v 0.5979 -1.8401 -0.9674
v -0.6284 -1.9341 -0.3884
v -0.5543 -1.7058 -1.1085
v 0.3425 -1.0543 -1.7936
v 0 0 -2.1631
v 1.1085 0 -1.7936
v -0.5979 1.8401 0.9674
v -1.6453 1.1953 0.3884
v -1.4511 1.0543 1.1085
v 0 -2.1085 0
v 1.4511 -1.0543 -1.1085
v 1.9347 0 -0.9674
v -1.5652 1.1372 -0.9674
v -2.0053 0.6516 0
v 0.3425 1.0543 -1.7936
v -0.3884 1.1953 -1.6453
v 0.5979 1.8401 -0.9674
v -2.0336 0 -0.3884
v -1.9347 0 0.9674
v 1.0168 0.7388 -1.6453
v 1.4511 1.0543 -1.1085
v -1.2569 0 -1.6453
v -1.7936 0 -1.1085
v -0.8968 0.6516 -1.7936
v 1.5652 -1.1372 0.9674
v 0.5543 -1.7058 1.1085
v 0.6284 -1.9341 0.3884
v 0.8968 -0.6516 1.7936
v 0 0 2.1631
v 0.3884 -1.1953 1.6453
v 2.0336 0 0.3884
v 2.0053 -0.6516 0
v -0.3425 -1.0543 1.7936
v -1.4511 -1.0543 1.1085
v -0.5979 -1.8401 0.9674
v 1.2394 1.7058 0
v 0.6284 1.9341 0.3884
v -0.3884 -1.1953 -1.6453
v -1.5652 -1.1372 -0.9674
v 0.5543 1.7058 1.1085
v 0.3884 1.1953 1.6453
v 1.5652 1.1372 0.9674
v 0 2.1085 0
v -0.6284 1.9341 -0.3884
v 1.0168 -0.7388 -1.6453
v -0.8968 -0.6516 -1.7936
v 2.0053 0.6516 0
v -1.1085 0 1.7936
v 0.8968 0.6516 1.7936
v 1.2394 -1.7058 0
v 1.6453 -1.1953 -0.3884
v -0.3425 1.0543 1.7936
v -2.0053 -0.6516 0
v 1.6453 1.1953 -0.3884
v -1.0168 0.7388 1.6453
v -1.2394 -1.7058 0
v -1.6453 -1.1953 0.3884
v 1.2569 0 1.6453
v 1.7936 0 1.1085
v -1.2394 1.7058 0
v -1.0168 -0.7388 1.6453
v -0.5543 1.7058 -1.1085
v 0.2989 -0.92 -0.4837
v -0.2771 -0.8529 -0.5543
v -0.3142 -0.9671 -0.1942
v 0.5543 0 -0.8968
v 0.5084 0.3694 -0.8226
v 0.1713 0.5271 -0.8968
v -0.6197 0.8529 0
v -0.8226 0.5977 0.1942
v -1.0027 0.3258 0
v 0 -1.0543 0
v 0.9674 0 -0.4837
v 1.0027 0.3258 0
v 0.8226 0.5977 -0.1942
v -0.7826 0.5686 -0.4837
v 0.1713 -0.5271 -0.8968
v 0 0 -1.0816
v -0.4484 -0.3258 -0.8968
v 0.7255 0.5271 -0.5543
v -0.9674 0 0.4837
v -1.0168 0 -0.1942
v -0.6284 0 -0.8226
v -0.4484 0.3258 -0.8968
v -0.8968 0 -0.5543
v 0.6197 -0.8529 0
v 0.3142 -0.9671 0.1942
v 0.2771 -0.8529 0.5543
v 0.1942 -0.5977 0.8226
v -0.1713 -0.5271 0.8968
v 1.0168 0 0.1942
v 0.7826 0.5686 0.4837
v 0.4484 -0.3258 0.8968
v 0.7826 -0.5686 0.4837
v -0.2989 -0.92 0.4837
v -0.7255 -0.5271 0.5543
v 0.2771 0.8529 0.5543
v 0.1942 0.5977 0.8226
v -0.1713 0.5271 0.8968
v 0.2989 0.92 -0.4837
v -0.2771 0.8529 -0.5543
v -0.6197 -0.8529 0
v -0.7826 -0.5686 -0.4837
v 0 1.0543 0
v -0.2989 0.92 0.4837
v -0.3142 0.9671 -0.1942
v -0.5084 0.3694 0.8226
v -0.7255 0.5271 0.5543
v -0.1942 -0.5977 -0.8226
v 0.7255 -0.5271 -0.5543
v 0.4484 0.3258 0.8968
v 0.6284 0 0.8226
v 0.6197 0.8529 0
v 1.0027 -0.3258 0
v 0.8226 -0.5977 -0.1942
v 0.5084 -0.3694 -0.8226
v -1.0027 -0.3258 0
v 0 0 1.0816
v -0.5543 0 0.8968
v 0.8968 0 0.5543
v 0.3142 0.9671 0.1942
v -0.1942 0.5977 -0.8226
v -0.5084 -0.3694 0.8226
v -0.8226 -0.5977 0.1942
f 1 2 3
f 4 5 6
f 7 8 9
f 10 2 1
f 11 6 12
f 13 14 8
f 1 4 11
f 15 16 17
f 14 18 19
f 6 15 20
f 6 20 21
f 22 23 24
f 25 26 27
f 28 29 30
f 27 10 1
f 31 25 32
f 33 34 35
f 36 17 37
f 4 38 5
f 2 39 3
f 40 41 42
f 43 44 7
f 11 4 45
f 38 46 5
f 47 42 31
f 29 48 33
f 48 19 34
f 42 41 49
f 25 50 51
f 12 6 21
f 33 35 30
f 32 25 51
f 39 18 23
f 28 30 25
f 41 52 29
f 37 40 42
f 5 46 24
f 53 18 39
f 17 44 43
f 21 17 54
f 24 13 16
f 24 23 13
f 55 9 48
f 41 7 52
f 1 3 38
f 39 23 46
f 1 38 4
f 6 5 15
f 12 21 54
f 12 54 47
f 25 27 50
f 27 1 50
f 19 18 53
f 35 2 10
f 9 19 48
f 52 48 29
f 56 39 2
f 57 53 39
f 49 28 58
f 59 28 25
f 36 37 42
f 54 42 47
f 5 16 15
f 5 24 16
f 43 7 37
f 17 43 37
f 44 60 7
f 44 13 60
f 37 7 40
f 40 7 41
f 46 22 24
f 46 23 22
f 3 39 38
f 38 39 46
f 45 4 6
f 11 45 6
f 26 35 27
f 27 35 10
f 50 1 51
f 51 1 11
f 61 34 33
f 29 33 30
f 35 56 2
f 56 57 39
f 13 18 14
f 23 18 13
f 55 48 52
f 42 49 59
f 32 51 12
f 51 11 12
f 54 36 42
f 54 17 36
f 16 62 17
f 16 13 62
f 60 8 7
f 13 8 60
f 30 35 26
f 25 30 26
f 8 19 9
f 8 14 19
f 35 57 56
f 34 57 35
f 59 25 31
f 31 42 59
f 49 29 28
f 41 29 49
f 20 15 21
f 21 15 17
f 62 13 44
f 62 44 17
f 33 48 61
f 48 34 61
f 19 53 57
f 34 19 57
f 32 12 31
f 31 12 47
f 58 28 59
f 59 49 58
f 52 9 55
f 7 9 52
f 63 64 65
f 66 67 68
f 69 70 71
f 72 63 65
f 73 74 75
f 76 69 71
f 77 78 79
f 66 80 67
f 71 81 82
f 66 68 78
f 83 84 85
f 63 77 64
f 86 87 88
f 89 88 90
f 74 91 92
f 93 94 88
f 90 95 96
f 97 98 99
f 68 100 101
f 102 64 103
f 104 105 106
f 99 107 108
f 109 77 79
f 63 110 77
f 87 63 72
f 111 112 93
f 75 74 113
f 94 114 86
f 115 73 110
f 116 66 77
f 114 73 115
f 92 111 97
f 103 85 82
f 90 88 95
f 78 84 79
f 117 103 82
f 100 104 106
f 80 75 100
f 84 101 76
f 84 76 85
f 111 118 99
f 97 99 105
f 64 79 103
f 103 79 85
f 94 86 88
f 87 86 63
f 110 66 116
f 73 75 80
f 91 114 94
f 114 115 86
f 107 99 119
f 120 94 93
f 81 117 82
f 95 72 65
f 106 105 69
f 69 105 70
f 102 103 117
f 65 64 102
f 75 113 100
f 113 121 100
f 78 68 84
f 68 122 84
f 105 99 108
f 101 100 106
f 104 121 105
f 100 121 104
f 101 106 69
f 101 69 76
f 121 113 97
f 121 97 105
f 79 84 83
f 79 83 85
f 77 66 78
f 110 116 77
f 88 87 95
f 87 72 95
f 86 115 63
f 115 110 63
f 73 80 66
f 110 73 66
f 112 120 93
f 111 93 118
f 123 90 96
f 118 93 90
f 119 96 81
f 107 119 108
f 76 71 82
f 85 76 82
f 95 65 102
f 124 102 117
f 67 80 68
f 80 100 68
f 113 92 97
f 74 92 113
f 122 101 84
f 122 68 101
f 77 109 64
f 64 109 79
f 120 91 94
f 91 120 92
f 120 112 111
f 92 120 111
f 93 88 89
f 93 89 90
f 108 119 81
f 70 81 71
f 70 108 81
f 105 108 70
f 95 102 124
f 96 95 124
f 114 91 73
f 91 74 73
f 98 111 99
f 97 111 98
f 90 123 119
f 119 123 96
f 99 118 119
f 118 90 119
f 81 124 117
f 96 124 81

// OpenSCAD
module dhxdron(r) {
    scale ( [r,r,r] ){
polyhedron( points = [ [-3.142158e-01, -9.670568e-01, -1.941960e-01], [-2.771276e-01, -8.529112e-01, -5.542553e-01], [2.989346e-01, -9.200262e-01, -4.836864e-01], [0.000000e+00, -1.054256e+00, 0.000000e+00], [5.084118e-01, -3.693828e-01, -8.226276e-01], [1.712743e-01, -5.271281e-01, -8.968039e-01], [5.551115e-17, 0.000000e+00, -1.081556e+00], [5.542553e-01, 0.000000e+00, -8.968039e-01], [-6.284316e-01, 0.000000e+00, -8.226276e-01], [-4.484020e-01, -3.257831e-01, -8.968039e-01], [-7.826210e-01, -5.686075e-01, -4.836864e-01], [-8.968039e-01, 0.000000e+00, -5.542553e-01], [-3.142158e-01, 9.670568e-01, -1.941960e-01], [0.000000e+00, 1.054256e+00, -0.000000e+00], [2.989346e-01, 9.200262e-01, -4.836864e-01], [-2.771276e-01, 8.529112e-01, -5.542553e-01], [-5.084118e-01, -3.693828e-01, 8.226276e-01], [-5.542553e-01, 0.000000e+00, 8.968039e-01], [-9.673728e-01, 0.000000e+00, 4.836864e-01], [-7.255296e-01, -5.271281e-01, 5.542553e-01], [1.016824e+00, 0.000000e+00, 1.941960e-01], [8.968039e-01, 0.000000e+00, 5.542553e-01], [7.826210e-01, -5.686075e-01, 4.836864e-01], [1.002657e+00, -3.257831e-01, 5.551115e-17], [3.142158e-01, -9.670568e-01, 1.941960e-01], [6.196763e-01, -8.529112e-01, -0.000000e+00], [5.084118e-01, 3.693828e-01, -8.226276e-01], [1.712743e-01, 5.271281e-01, -8.968039e-01], [-1.016824e+00, 0.000000e+00, -1.941960e-01], [-1.002657e+00, -3.257831e-01, -5.551115e-17], [3.142158e-01, 9.670568e-01, 1.941960e-01], [6.196763e-01, 8.529112e-01, -0.000000e+00], [-5.084118e-01, 3.693828e-01, 8.226276e-01], [-7.255296e-01, 5.271281e-01, 5.542553e-01], [6.284316e-01, 0.000000e+00, 8.226276e-01], [4.484020e-01, -3.257831e-01, 8.968039e-01], [-2.989346e-01, -9.200262e-01, 4.836864e-01], [-6.196763e-01, -8.529112e-01, -0.000000e+00], [9.673728e-01, 0.000000e+00, -4.836864e-01], [7.255296e-01, -5.271281e-01, -5.542553e-01], [-7.826210e-01, 5.686075e-01, -4.836864e-01], [-4.484020e-01, 3.257831e-01, -8.968039e-01], [-6.196763e-01, 8.529112e-01, -0.000000e+00], [-2.989346e-01, 9.200262e-01, 4.836864e-01], [-1.712743e-01, -5.271281e-01, 8.968039e-01], [-5.551115e-17, 0.000000e+00, 1.081556e+00], [1.002657e+00, 3.257831e-01, 5.551115e-17], [7.826210e-01, 5.686075e-01, 4.836864e-01], [2.771276e-01, -8.529112e-01, 5.542553e-01], [7.255296e-01, 5.271281e-01, -5.542553e-01], [-1.002657e+00, 3.257831e-01, -5.551115e-17], [2.771276e-01, 8.529112e-01, 5.542553e-01], [-1.712743e-01, 5.271281e-01, 8.968039e-01], [4.484020e-01, 3.257831e-01, 8.968039e-01], [-1.941960e-01, -5.976740e-01, -8.226276e-01], [-1.941960e-01, 5.976740e-01, -8.226276e-01], [-8.226276e-01, -5.976740e-01, 1.941960e-01], [8.226276e-01, -5.976740e-01, -1.941960e-01], [8.226276e-01, 5.976740e-01, -1.941960e-01], [-8.226276e-01, 5.976740e-01, 1.941960e-01], [1.941960e-01, -5.976740e-01, 8.226276e-01], [1.941960e-01, 5.976740e-01, 8.226276e-01] ], faces = [ [ 3, 2, 1, 0 ] , [ 7, 6, 5, 4 ] , [ 11, 10, 9, 8 ] , [ 15, 14, 13, 12 ] , [ 19, 18, 17, 16 ] , [ 23, 22, 21, 20 ] , [ 25, 2, 3, 24 ] , [ 27, 6, 7, 26 ] , [ 29, 10, 11, 28 ] , [ 13, 14, 31, 30 ] , [ 17, 18, 33, 32 ] , [ 21, 22, 35, 34 ] , [ 37, 36, 3, 0 ] , [ 39, 38, 7, 4 ] , [ 41, 40, 11, 8 ] , [ 13, 43, 42, 12 ] , [ 17, 45, 44, 16 ] , [ 21, 47, 46, 20 ] , [ 3, 36, 48, 24 ] , [ 7, 38, 49, 26 ] , [ 11, 40, 50, 28 ] , [ 51, 43, 13, 30 ] , [ 52, 45, 17, 32 ] , [ 53, 47, 21, 34 ] , [ 1, 2, 5, 54 ] , [ 5, 6, 9, 54 ] , [ 9, 10, 1, 54 ] , [ 27, 14, 15, 55 ] , [ 29, 18, 19, 56 ] , [ 25, 22, 23, 57 ] , [ 39, 2, 25, 57 ] , [ 41, 6, 27, 55 ] , [ 37, 10, 29, 56 ] , [ 31, 14, 49, 58 ] , [ 33, 18, 50, 59 ] , [ 35, 22, 48, 60 ] , [ 19, 36, 37, 56 ] , [ 23, 38, 39, 57 ] , [ 15, 40, 41, 55 ] , [ 42, 43, 33, 59 ] , [ 44, 45, 35, 60 ] , [ 46, 47, 31, 58 ] , [ 48, 36, 44, 60 ] , [ 49, 38, 46, 58 ] , [ 50, 40, 42, 59 ] , [ 52, 43, 51, 61 ] , [ 53, 45, 52, 61 ] , [ 51, 47, 53, 61 ] , [ 5, 2, 39, 4 ] , [ 9, 6, 41, 8 ] , [ 1, 10, 37, 0 ] , [ 49, 14, 27, 26 ] , [ 50, 18, 29, 28 ] , [ 48, 22, 25, 24 ] , [ 44, 36, 19, 16 ] , [ 46, 38, 23, 20 ] , [ 42, 40, 15, 12 ] , [ 33, 43, 52, 32 ] , [ 35, 45, 53, 34 ] , [ 31, 47, 51, 30 ]  ], convexity = 4);
    }
}

module egg(inner, outer) {
    difference () {
        dhxdron(outer);
        dhxdron(inner);
    }
}

render() egg(1,2);
